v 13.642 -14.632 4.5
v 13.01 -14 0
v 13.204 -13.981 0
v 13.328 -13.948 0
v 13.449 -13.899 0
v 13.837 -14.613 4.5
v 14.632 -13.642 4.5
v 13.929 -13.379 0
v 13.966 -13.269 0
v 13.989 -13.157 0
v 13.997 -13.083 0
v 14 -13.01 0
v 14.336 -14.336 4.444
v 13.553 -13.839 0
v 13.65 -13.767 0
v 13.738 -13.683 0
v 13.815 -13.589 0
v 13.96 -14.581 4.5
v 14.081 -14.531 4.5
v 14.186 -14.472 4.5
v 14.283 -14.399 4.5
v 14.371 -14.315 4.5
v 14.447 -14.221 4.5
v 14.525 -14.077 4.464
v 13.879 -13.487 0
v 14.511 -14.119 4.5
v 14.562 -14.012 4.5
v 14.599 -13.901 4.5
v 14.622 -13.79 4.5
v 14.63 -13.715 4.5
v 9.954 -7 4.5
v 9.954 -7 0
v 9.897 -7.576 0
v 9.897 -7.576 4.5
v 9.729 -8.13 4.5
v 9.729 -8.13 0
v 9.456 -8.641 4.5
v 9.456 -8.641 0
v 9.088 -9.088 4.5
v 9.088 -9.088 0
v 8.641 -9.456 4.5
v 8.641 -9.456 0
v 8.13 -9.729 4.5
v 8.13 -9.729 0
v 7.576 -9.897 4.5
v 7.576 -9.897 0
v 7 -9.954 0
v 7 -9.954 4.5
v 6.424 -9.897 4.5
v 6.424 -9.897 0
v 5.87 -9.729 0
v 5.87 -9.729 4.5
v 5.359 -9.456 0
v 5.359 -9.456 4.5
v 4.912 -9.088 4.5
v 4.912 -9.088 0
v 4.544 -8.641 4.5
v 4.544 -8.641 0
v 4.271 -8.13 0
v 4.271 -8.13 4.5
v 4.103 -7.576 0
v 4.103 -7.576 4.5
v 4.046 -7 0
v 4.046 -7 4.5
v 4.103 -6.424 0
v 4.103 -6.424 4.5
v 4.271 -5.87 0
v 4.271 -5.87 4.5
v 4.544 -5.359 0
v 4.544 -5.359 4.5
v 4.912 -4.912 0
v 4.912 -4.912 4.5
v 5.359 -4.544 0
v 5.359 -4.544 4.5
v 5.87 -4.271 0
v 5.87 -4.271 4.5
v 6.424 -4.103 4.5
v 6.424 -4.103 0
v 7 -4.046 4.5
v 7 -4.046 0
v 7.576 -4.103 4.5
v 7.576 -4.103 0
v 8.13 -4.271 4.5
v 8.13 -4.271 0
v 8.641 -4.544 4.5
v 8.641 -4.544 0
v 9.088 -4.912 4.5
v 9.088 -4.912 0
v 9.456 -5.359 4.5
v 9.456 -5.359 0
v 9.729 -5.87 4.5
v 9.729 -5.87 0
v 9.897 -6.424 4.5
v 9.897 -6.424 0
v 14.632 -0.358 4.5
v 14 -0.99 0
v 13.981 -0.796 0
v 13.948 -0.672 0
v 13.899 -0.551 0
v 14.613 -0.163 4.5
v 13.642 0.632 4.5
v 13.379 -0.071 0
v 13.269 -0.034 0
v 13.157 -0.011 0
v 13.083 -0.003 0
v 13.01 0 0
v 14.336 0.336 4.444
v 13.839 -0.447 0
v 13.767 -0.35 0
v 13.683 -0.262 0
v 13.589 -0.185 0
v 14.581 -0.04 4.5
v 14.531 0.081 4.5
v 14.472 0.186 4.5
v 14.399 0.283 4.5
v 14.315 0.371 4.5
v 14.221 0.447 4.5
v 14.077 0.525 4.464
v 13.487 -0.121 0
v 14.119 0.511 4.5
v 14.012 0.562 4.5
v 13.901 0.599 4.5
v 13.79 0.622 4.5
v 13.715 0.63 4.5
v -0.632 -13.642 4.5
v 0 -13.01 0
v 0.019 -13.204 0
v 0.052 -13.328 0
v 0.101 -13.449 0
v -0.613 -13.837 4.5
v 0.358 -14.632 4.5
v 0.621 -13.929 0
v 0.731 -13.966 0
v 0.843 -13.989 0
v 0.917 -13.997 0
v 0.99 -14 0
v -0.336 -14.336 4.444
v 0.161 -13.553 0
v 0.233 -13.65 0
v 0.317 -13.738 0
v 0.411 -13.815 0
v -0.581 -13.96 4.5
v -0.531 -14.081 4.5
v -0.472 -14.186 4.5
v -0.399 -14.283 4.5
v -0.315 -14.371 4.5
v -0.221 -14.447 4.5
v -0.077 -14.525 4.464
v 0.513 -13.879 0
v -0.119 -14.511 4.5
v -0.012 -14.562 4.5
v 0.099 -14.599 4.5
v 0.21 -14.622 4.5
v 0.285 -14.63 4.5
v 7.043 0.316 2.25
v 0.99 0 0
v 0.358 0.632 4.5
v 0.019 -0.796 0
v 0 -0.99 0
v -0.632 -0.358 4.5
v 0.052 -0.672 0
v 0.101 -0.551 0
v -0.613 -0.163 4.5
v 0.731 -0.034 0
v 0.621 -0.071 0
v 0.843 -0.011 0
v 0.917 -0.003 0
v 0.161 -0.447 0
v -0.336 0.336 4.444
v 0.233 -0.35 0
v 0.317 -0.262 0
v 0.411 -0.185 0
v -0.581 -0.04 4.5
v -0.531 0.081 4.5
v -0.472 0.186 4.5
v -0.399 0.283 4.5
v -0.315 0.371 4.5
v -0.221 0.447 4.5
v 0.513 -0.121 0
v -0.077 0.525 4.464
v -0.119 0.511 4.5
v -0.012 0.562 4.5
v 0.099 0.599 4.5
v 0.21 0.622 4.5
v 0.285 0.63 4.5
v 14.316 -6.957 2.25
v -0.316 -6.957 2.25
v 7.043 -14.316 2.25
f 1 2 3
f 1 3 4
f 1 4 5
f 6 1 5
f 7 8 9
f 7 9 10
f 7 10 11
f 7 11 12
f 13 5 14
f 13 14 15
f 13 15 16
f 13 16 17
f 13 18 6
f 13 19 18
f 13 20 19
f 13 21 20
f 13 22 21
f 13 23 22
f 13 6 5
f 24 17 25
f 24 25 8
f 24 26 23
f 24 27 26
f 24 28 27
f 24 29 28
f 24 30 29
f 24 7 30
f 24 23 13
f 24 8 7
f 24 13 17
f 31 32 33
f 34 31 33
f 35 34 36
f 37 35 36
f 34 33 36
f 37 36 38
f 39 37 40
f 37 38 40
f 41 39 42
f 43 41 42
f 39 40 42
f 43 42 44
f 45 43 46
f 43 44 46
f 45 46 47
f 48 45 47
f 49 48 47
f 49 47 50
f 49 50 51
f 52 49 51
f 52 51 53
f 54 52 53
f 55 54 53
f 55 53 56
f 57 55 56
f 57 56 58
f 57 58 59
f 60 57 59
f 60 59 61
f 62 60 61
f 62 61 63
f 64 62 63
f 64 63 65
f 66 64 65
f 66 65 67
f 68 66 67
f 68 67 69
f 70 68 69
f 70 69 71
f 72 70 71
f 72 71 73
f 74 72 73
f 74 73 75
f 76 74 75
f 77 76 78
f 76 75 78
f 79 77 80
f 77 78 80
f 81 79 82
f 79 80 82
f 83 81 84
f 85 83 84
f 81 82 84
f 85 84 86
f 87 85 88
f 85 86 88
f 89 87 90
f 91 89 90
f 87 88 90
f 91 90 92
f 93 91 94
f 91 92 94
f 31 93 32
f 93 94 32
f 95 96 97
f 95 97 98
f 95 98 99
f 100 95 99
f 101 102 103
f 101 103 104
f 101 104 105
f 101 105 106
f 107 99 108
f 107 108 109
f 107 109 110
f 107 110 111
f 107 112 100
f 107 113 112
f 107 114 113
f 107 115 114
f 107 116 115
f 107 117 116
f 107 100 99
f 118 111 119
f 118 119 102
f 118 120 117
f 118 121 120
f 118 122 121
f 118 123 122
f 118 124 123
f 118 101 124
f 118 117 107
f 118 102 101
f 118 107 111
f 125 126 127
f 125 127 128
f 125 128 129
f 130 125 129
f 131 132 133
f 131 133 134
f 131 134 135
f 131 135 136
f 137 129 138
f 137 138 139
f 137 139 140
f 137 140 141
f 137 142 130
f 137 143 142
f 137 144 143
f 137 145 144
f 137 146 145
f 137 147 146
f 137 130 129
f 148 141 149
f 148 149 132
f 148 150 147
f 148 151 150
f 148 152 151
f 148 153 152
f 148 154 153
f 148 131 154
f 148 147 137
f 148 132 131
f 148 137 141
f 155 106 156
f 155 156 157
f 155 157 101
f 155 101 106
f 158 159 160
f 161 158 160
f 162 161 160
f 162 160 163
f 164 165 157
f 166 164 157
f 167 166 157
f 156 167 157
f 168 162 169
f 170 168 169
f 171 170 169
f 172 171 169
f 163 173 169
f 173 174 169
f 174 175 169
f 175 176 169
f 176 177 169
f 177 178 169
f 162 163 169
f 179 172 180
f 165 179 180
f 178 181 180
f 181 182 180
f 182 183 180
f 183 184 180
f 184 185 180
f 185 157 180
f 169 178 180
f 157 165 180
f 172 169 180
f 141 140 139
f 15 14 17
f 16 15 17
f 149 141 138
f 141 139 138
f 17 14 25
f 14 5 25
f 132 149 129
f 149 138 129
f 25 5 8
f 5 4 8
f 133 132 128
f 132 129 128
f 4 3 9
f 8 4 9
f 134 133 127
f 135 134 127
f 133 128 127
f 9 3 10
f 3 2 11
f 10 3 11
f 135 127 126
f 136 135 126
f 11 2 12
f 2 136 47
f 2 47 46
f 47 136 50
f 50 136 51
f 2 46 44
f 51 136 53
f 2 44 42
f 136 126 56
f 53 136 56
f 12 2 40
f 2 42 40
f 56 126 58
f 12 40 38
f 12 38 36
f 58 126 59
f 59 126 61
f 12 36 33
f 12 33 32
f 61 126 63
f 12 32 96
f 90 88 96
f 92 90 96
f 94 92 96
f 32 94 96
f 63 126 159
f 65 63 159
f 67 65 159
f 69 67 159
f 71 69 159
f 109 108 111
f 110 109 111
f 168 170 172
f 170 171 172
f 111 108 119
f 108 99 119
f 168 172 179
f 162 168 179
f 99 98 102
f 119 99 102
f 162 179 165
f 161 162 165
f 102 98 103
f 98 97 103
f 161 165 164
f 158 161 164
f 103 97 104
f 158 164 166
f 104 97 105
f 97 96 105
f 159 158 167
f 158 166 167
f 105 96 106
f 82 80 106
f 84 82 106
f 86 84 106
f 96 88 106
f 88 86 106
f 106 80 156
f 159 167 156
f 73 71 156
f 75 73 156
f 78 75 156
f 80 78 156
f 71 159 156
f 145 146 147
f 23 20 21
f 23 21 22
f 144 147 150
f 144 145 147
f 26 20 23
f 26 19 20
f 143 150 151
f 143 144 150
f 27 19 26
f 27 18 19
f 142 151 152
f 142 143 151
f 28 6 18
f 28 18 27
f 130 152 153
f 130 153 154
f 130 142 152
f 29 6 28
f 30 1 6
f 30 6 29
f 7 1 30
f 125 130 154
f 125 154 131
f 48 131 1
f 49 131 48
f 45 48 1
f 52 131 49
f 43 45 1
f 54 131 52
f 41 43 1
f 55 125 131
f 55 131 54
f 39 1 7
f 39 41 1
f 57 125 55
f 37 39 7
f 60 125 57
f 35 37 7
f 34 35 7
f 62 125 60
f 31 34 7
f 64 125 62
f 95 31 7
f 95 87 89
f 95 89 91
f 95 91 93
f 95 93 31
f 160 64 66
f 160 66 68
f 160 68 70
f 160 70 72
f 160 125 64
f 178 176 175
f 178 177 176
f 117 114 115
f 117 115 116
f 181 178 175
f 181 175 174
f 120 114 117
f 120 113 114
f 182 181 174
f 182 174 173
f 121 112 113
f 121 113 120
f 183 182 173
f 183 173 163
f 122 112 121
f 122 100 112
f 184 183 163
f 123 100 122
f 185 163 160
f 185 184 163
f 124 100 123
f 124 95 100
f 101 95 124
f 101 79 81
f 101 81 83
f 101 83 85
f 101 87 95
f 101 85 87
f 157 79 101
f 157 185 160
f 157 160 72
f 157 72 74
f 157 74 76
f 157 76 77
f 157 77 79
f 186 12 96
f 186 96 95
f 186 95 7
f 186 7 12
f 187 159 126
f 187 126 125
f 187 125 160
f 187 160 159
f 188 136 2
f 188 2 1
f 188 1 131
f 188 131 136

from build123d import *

# Parameters (mm, degrees)
F0_W     = 14
F0_H     = 14
F1_DEPTH = 4.5
F1_TAPER = -8
F2_R     = 1
F3_R     = 2.9535288369
F4_DEPTH = 25


with BuildPart() as f1:
    # F0 (on Top) → F1 (new body)
    with BuildSketch(Plane.XY):
        with Locations((7, -7)):
            Rectangle(F0_W, F0_H)
    extrude(amount=F1_DEPTH, taper=F1_TAPER)

    # F2
    f2_edges = [f1.edges().sort_by_distance(p)[0] for p in [
        (-0.316217, -14.316217, 2.25),
        (14.316217, -14.316217, 2.25),
        (14.316217, 0.316217, 2.25),
        (-0.316217, 0.316217, 2.25),
    ]]
    fillet(f2_edges, radius=F2_R)

    # F3 (on face) → F4 (cut)
    with BuildSketch(Plane(origin=(0, 0, 0), x_dir=(1, 0, 0), z_dir=(0, 0, -1))):
        with Locations((7, 7)):
            Circle(F3_R)
    extrude(amount=-F4_DEPTH, mode=Mode.SUBTRACT)


solid = f1.part
